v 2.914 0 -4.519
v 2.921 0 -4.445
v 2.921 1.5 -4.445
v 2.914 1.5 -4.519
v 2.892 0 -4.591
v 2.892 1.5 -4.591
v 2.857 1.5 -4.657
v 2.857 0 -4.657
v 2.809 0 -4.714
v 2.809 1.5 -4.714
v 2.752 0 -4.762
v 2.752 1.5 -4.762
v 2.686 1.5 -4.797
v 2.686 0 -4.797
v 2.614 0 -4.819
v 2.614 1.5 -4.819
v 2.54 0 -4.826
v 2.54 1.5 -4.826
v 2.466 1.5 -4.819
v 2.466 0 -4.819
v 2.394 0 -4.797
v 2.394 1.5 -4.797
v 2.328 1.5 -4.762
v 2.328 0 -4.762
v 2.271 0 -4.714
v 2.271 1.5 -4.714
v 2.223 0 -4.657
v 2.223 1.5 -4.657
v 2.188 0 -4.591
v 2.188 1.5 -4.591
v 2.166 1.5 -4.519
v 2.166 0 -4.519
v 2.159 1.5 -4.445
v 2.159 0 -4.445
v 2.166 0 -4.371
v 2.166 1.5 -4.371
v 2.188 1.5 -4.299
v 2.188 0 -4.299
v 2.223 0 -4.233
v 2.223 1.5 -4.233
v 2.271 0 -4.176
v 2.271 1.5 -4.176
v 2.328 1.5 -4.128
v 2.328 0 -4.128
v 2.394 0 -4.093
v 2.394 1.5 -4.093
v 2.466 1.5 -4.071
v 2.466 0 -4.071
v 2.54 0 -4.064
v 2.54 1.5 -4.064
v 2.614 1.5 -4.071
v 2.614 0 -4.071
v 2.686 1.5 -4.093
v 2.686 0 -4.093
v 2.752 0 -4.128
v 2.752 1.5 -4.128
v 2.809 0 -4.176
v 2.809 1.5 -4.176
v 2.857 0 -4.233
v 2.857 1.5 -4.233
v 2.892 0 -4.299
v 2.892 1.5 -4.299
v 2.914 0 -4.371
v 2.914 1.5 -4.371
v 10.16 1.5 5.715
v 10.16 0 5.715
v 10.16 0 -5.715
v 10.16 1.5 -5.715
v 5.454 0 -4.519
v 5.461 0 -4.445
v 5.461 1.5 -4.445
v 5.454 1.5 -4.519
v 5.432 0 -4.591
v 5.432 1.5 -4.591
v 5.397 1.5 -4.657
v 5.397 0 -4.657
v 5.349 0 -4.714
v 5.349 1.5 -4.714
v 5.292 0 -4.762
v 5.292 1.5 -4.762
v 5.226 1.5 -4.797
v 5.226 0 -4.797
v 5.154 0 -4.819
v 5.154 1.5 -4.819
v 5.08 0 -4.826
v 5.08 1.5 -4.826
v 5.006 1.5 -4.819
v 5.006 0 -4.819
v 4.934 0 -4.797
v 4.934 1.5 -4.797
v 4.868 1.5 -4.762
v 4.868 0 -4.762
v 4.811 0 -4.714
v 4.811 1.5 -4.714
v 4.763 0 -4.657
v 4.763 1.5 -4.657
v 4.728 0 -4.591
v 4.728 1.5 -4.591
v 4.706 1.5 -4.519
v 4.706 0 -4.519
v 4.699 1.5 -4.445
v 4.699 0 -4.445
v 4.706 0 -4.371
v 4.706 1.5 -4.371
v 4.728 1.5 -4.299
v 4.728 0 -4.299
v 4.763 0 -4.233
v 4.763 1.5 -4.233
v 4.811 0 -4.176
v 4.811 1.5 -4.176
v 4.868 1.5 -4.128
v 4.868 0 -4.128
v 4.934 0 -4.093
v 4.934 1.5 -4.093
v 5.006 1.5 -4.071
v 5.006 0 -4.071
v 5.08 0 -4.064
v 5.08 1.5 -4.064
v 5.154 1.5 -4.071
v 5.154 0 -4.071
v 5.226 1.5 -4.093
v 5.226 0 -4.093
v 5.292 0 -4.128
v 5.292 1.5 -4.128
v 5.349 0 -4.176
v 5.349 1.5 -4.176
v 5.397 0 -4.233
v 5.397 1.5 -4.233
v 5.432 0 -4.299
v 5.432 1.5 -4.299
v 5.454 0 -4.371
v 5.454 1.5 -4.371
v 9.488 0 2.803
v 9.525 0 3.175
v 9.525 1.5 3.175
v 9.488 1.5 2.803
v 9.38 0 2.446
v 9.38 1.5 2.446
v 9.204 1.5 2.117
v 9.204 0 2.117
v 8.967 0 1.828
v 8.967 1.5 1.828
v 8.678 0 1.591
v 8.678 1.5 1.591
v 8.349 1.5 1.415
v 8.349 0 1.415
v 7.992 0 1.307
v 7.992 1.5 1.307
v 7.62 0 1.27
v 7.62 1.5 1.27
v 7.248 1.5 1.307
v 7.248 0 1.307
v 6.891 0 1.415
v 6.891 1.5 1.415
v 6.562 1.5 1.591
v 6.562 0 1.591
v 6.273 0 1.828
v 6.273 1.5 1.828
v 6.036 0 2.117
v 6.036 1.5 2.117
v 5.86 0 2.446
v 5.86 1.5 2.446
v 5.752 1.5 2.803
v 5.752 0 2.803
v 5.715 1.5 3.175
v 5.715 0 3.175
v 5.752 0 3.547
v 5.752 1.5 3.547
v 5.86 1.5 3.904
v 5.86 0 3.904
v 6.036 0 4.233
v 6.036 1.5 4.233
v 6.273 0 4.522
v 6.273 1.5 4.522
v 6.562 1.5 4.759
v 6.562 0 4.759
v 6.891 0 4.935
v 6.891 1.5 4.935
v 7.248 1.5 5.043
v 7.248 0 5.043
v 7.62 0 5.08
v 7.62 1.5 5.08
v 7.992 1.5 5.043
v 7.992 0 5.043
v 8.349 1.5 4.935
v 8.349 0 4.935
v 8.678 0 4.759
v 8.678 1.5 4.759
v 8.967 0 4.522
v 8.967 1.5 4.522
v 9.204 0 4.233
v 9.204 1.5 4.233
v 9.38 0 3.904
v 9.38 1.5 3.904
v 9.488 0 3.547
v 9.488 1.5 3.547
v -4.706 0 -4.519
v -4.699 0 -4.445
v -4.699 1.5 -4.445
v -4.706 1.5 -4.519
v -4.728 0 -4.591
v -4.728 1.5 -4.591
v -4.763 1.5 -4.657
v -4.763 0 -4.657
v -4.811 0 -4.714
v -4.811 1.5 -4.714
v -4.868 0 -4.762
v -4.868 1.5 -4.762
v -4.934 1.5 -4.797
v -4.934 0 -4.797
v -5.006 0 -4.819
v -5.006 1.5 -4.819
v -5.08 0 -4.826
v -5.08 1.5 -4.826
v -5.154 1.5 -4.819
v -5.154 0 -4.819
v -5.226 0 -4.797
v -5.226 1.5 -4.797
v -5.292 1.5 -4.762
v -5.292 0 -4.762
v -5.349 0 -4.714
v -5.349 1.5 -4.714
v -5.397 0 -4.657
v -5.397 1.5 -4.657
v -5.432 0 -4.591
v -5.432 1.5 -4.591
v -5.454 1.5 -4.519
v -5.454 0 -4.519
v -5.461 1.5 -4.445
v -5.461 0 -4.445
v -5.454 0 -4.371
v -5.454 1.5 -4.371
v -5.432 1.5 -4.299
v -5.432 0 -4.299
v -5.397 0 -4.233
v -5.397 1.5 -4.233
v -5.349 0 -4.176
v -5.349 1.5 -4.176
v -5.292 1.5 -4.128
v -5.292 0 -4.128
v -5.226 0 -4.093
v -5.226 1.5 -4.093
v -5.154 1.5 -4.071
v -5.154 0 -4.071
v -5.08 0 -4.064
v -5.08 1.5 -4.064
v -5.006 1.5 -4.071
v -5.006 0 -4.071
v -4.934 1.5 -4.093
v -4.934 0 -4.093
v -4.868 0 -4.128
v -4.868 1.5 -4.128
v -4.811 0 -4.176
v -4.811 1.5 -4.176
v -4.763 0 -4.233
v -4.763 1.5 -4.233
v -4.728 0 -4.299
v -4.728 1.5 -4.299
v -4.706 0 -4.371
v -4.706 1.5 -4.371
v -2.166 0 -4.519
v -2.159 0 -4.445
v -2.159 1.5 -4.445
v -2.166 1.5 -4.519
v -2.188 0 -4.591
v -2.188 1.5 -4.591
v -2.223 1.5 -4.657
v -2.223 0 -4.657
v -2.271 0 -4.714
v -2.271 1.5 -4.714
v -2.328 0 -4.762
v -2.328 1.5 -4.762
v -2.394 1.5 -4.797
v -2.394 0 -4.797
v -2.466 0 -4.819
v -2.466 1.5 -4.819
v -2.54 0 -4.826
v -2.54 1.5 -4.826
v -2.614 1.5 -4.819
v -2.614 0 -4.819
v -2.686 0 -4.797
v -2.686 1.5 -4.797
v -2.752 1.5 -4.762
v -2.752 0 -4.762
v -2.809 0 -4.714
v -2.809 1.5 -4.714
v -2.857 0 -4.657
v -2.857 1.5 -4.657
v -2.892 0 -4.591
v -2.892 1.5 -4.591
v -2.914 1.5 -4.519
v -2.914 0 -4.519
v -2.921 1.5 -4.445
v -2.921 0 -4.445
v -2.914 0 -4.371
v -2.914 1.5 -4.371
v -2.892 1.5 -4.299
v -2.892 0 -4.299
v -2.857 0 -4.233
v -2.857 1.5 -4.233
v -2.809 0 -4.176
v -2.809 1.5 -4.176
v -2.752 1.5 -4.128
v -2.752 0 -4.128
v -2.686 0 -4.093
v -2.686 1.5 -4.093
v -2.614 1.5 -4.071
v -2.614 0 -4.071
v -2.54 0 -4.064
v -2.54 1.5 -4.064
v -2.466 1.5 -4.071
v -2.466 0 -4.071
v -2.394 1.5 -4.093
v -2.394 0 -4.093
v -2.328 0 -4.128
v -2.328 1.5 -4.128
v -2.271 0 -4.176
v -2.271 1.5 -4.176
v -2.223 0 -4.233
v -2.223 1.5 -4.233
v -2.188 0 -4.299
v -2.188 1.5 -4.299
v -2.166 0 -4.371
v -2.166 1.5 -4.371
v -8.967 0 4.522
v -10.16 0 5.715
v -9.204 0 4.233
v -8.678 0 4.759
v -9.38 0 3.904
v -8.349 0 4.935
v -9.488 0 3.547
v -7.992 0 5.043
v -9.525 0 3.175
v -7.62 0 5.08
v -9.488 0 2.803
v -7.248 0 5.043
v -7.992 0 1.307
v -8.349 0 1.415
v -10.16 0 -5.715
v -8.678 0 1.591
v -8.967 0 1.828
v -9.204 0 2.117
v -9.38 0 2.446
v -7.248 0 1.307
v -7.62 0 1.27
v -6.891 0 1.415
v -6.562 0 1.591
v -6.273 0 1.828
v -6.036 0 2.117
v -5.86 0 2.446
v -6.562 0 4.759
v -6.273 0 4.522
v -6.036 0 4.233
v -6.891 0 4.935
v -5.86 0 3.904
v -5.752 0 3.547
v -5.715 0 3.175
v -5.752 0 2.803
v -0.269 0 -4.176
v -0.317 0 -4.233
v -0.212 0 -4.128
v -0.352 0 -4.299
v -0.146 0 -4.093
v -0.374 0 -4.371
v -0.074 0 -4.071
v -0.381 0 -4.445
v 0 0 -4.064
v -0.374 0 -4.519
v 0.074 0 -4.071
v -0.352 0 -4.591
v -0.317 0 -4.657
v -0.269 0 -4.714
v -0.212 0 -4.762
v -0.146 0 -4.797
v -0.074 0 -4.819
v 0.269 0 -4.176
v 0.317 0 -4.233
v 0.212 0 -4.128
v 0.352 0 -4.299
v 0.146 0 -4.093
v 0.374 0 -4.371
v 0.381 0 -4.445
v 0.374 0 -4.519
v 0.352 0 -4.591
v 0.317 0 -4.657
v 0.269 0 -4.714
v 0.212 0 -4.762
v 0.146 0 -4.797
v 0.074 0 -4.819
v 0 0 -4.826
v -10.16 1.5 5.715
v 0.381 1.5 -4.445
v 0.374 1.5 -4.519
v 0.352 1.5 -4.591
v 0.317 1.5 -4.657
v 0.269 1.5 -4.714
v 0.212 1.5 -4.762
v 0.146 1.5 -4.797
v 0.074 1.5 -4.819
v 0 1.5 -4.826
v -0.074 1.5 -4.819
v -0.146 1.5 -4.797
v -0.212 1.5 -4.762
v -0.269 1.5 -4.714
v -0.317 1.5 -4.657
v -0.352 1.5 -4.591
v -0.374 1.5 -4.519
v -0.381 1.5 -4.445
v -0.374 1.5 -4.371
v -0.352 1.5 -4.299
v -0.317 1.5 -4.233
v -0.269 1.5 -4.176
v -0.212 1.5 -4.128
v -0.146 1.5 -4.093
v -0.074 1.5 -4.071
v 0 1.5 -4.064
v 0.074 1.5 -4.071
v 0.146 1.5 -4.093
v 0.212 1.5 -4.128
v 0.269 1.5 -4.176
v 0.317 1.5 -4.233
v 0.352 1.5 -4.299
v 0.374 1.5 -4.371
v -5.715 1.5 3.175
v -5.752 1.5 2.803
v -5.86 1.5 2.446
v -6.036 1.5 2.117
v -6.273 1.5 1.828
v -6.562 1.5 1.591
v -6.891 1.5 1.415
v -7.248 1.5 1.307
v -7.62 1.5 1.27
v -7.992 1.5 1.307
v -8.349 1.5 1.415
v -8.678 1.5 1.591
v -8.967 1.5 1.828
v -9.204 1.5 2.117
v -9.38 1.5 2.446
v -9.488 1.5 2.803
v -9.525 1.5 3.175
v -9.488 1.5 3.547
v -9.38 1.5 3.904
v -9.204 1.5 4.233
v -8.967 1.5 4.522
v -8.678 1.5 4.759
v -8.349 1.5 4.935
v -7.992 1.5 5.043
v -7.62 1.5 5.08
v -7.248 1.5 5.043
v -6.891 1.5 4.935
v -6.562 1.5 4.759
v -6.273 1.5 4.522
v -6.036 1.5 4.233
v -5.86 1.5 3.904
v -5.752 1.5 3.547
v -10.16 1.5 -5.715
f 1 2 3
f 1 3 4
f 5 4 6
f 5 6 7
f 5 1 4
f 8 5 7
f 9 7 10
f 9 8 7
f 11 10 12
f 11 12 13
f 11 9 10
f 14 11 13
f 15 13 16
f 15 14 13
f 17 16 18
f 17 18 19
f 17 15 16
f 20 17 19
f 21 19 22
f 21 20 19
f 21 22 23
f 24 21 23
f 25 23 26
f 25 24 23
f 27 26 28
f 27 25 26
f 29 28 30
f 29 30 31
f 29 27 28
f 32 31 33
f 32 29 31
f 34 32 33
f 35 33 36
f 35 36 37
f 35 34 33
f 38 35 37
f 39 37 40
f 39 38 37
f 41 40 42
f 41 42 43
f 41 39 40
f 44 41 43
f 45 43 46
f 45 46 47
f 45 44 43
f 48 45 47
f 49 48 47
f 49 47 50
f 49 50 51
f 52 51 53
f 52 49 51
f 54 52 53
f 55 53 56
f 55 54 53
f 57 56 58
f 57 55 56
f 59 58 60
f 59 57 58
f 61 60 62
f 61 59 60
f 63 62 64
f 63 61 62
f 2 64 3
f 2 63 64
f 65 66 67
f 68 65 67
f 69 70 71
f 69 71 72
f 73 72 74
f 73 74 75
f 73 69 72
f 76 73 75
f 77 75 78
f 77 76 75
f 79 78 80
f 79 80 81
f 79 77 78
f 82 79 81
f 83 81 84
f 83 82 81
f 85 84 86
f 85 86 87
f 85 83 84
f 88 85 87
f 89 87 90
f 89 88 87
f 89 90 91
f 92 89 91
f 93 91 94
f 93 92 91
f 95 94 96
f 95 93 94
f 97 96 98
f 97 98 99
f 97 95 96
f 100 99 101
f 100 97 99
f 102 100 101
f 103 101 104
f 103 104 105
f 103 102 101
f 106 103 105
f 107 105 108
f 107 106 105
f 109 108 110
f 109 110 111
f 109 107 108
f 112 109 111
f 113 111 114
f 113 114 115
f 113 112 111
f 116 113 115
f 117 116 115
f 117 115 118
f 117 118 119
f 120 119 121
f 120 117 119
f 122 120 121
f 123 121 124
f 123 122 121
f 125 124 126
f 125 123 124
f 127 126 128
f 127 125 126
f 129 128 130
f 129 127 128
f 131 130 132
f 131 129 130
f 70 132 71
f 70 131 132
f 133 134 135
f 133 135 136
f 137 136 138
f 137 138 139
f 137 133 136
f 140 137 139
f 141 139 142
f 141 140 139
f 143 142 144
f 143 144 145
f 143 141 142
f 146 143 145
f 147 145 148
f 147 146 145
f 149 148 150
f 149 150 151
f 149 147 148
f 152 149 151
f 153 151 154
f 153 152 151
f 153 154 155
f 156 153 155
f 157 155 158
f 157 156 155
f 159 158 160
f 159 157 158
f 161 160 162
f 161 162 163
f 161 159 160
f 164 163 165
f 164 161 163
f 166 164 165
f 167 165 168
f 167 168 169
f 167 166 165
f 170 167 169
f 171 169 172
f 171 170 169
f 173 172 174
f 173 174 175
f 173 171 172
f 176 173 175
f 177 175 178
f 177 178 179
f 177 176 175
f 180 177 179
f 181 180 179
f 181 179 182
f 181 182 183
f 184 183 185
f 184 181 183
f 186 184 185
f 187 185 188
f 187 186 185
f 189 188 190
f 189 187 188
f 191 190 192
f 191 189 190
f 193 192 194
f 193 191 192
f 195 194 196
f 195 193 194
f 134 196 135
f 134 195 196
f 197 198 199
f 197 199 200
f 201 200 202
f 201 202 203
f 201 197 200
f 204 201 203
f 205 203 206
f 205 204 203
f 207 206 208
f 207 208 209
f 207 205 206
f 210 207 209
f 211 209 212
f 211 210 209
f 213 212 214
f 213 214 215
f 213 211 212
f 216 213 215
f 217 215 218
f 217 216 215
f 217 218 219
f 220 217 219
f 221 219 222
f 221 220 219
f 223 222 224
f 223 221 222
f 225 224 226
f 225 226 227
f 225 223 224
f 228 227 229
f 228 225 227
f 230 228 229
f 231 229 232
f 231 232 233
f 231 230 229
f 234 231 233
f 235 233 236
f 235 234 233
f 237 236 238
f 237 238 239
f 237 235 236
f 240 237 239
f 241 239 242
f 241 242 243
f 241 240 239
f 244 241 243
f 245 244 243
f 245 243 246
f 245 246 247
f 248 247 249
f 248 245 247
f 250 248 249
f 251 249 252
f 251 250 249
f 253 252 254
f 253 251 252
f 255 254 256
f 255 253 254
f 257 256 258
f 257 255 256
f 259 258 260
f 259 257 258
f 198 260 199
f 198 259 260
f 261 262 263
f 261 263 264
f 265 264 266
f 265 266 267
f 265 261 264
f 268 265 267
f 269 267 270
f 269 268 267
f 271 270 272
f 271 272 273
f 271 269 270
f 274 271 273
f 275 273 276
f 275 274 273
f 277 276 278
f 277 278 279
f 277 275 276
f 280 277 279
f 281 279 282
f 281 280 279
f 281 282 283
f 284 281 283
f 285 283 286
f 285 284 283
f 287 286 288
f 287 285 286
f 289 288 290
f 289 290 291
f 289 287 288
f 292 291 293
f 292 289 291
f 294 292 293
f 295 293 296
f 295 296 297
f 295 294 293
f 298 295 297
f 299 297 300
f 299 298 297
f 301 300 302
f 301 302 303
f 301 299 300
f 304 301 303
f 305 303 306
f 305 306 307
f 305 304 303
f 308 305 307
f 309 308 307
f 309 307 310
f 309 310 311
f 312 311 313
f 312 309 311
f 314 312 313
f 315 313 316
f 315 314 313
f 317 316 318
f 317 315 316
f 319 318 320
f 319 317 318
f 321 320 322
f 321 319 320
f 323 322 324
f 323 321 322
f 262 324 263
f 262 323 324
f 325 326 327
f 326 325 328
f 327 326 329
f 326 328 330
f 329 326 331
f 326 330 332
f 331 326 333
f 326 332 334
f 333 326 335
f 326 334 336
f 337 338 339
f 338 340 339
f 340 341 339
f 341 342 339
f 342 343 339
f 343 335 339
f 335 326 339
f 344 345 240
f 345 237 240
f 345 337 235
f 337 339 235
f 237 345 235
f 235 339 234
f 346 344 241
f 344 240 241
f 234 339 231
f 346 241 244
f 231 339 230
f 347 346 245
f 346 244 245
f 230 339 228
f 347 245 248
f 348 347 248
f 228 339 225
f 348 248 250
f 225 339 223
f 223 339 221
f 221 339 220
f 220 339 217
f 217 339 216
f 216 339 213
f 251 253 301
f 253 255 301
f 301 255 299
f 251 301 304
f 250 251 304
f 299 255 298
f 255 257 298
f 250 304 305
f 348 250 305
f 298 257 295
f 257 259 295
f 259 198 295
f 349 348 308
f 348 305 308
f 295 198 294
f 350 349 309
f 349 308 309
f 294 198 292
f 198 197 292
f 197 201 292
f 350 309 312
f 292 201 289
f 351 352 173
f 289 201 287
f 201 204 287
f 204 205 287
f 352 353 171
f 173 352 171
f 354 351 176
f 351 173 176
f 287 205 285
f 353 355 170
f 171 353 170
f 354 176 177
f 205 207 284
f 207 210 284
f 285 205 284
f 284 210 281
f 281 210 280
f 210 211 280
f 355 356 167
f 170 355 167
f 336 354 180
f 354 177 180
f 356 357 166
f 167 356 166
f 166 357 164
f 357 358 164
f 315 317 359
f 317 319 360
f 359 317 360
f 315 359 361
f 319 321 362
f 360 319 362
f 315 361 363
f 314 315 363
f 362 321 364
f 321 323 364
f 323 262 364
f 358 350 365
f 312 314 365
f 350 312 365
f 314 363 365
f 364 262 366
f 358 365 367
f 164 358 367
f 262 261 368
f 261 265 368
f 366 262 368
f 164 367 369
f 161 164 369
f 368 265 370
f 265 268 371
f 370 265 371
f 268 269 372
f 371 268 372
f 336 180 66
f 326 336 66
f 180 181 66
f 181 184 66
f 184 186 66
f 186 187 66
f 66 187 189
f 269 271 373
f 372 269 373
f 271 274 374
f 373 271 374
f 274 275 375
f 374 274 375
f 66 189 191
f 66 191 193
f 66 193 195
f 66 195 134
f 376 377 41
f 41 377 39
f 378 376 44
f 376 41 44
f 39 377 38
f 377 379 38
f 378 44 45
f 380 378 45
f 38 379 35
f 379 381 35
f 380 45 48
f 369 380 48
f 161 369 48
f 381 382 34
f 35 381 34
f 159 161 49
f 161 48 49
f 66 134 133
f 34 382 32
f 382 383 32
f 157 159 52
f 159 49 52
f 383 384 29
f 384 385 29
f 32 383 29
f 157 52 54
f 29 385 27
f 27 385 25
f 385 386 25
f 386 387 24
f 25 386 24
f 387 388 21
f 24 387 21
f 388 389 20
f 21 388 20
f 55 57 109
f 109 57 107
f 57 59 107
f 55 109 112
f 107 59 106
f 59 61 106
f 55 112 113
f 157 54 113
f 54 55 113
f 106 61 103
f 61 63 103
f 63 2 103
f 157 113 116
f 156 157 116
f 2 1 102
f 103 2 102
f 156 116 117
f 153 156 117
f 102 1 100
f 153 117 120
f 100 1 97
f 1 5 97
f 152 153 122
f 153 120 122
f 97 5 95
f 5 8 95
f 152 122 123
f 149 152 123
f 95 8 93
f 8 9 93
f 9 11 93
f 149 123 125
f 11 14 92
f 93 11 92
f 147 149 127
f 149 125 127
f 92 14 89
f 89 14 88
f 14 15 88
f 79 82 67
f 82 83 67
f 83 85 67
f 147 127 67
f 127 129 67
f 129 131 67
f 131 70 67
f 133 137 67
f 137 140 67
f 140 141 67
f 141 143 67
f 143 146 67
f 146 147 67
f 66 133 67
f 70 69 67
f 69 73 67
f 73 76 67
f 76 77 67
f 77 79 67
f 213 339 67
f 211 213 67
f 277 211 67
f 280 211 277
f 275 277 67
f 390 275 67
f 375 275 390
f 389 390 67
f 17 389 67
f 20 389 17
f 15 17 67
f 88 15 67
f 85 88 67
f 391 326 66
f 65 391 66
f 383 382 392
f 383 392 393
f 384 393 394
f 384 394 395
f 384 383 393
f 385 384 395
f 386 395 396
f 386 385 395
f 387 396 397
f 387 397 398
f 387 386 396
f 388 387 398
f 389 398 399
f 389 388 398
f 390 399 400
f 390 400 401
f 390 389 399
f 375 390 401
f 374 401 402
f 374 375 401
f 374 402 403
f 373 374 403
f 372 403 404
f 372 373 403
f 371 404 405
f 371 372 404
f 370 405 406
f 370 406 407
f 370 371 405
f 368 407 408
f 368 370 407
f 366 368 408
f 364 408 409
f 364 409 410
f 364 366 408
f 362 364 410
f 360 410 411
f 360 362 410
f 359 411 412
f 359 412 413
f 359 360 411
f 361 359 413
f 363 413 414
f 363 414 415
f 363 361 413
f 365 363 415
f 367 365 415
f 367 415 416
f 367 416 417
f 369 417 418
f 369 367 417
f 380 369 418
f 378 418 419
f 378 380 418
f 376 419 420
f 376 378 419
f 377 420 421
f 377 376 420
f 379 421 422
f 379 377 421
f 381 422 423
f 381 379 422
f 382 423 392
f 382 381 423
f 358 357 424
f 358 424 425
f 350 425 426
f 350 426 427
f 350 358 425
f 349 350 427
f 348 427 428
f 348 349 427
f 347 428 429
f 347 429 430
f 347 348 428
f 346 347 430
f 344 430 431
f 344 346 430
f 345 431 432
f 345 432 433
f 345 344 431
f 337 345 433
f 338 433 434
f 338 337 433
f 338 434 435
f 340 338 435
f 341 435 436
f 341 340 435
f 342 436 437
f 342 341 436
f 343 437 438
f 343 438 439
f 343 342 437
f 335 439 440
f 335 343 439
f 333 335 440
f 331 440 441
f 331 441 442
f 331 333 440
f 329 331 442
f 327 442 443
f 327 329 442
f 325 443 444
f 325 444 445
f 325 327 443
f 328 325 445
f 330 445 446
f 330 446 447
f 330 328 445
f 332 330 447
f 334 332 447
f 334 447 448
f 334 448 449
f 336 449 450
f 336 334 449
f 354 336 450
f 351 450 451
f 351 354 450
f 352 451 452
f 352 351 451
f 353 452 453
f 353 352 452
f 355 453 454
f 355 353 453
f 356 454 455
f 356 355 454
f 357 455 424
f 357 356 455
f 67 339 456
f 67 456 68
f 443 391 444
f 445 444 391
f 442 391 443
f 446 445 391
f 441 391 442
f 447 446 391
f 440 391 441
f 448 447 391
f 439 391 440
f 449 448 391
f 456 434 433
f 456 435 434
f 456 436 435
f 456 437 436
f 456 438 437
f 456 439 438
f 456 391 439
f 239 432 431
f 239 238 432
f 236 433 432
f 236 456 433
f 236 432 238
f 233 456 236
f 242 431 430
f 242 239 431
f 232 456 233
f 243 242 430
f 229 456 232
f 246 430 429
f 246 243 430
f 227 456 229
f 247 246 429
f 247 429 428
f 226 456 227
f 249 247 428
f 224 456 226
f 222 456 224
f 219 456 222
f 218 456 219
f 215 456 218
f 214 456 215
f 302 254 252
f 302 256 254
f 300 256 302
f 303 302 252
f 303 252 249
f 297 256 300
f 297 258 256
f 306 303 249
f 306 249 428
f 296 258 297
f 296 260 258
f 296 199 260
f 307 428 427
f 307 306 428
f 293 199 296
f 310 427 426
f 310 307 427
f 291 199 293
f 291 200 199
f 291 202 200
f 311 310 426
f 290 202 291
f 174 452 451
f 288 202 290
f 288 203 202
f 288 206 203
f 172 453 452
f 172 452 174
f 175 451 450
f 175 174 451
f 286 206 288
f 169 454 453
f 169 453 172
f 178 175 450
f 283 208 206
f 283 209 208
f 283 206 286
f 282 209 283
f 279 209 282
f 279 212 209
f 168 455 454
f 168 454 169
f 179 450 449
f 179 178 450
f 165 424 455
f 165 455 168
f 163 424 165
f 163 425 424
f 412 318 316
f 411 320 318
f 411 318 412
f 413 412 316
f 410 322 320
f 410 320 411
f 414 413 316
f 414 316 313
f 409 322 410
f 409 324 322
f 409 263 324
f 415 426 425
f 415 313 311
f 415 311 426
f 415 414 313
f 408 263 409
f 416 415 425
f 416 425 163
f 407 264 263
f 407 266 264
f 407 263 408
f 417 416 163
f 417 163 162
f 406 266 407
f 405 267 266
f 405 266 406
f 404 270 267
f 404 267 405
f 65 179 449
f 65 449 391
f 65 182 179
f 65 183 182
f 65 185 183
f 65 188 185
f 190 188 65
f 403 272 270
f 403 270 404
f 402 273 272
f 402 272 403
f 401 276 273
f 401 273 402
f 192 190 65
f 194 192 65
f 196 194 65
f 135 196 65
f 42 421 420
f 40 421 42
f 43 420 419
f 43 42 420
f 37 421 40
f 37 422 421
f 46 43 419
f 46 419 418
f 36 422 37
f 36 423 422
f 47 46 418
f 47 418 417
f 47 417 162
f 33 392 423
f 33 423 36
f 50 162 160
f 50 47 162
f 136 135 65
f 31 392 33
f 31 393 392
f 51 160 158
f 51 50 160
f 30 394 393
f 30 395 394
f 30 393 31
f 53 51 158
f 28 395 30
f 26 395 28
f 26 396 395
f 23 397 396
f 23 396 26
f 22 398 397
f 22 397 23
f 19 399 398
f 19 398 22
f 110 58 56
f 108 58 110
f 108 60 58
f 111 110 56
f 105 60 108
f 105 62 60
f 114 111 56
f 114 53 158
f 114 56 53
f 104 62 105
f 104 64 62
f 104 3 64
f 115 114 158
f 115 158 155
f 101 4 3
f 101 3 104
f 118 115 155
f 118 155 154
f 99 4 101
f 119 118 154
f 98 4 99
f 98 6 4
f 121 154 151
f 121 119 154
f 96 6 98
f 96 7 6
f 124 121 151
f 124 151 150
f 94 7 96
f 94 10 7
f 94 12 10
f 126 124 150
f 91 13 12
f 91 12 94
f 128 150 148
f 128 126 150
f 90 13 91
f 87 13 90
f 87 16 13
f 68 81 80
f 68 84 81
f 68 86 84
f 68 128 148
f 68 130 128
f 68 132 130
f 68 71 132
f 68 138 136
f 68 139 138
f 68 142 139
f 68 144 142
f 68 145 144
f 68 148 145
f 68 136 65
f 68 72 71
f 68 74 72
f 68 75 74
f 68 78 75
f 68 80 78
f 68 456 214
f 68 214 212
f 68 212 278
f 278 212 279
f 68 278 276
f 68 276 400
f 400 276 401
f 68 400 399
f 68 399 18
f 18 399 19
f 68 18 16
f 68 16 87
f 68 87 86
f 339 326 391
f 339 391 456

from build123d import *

# Parameters (mm, degrees)
SKETCH_1_W      = 20.32
SKETCH_1_H      = 11.43
SKETCH_1_R      = 1.905
SKETCH_1_R_2    = 0.381
EXTRUDE_1_DEPTH = 1.5


with BuildPart() as part:
    # 스케치1 → 보스-돌출1 (new body)
    with BuildSketch(Plane(origin=(0, 0, 0), x_dir=(1, 0, 0), z_dir=(0, 1, 0))):
        Rectangle(SKETCH_1_W, SKETCH_1_H)
        with Locations((-7.62, -3.175)):
            Circle(SKETCH_1_R, mode=Mode.SUBTRACT)
        with Locations((7.62, -3.175)):
            Circle(SKETCH_1_R, mode=Mode.SUBTRACT)
        with Locations((5.08, 4.445)):
            Circle(SKETCH_1_R_2, mode=Mode.SUBTRACT)
        with Locations((2.54, 4.445)):
            Circle(SKETCH_1_R_2, mode=Mode.SUBTRACT)
        with Locations((-2.54, 4.445)):
            Circle(SKETCH_1_R_2, mode=Mode.SUBTRACT)
        with Locations((-5.08, 4.445)):
            Circle(SKETCH_1_R_2, mode=Mode.SUBTRACT)
        with Locations((0, 4.445)):
            Circle(SKETCH_1_R_2, mode=Mode.SUBTRACT)
    extrude(amount=EXTRUDE_1_DEPTH)


solid = part.part
